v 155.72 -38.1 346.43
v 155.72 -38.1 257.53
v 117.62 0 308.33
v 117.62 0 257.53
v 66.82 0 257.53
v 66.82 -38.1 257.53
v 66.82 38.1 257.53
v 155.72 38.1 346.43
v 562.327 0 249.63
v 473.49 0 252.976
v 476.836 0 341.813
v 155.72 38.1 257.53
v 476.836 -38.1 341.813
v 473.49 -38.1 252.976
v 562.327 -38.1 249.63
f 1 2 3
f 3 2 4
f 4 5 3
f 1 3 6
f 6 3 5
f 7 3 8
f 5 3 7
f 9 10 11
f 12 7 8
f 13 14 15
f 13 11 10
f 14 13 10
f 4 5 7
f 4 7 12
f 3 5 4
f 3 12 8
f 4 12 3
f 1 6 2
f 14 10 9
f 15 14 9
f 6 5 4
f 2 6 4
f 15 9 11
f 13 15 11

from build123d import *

# Parameters (mm, degrees)
F1_DEPTH = 38.1
F3_DEPTH = 38.1
F5_DEPTH = 38.1
F7_DEPTH = 120.182553
F9_DEPTH = 100.719053


with BuildPart() as f1:
    # F0 (on Front) → F1 (new body)
    with BuildSketch(Plane.XZ):
        Polygon((155.720153, 346.429633), (66.820153, 257.529633), (155.720153, 257.529633), align=None)
    extrude(amount=F1_DEPTH)

    # F8 (on face) → F9 (cut, through all)
    with BuildSketch(Plane(origin=(0, 0, 257.529633), x_dir=(1, 0, 0), z_dir=(0, 0, -1))):
        Polygon((155.720153, 0), (155.720153, 38.1), (117.620153, 0), align=None)
    extrude(amount=-F9_DEPTH, mode=Mode.SUBTRACT)


with BuildPart() as f3:
    # F2 (on Front) → F3 (new body)
    with BuildSketch(Plane.XZ):
        Polygon((205.645326, 358.247686), (219.244342, 257.561904), (319.930124, 271.16092), align=None)
    extrude(amount=F3_DEPTH)

    # F6 (on face) → F7 (cut, through all)
    with BuildSketch(Plane(origin=(-30.236229, 0, 223.866081), x_dir=(0.991002, 0, 0.133849), z_dir=(0.133849, 0, -0.991002))):
        Polygon((289.845832, 0), (251.745832, 38.1), (251.745832, 0), align=None)
    extrude(amount=-F7_DEPTH, mode=Mode.SUBTRACT)


with BuildPart() as f5:
    # F4 (on Front) → F5 (new body)
    with BuildSketch(Plane.XZ):
        Polygon((562.326928, 249.629819), (476.835641, 341.812571), (473.489908, 252.975551), align=None)
    extrude(amount=F5_DEPTH)


with BuildPart() as f11_1:
    # F11: instance of F1
    add(f1.part.mirror(Plane.XZ))


solid = Compound([f1.part, f5.part, f11_1.part])
